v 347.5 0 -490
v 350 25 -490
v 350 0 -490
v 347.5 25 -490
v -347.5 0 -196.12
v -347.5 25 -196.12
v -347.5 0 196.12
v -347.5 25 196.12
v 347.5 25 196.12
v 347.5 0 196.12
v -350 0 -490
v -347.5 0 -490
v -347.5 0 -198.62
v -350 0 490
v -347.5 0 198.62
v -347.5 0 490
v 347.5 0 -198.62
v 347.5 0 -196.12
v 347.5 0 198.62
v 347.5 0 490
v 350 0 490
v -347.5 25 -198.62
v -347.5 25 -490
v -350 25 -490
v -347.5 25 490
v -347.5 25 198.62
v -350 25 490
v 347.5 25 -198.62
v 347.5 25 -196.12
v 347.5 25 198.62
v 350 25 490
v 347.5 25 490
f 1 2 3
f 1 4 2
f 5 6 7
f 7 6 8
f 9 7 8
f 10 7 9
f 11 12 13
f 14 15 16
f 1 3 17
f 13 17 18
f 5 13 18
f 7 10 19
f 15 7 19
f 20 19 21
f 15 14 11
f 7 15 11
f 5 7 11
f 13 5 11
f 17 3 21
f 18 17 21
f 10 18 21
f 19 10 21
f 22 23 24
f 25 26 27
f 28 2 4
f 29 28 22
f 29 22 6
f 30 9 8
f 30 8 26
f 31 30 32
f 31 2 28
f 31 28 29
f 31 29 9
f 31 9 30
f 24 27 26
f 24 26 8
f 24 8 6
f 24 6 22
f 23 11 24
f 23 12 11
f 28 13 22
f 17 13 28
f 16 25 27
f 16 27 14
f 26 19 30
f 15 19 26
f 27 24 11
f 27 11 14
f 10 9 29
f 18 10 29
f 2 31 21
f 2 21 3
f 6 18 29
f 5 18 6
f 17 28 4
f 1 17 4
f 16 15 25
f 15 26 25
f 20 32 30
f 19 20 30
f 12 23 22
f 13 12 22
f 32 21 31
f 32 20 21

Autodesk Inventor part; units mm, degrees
ref_plane "YZ Plane" through (0, 0, 0) normal (1, 0, 0) x (0, 1, 0)
ref_plane "XZ Plane" through (0, 0, 0) normal (0, 1, 0) x (-1, 0, 0)
ref_plane "XY Plane" through (0, 0, 0) normal (0, 0, 1) x (1, 0, 0)
sketch "Sketch1" plane through (0, 0, 0) normal (0, 1, 0) x (-1, 0, 0)
  line L0 (345, 196.12) -> (-345, 196.12)
  line L1 (-345, 196.12) -> (-345, -196.12)
  line L2 (-345, -196.12) -> (345, -196.12)
  line L3 (345, -196.12) -> (345, 196.12)
  line L4 (345, 196.12) -> (-345, -196.12) construction
  line L5 (-345, 196.12) -> (345, -196.12) construction
  line L6 (347.5, -198.62) -> (-347.5, -198.62)
  line L7 (-347.5, -198.62) -> (-347.5, 198.62)
  line L8 (-347.5, 198.62) -> (347.5, 198.62)
  line L9 (347.5, 198.62) -> (347.5, -198.62)
  line L10 (345, -196.12) -> (347.5, -196.12)
  line L11 (345, 196.12) -> (347.5, 196.12)
  line L12 (-345, -196.12) -> (-347.5, -196.12)
  line L13 (-345, 196.12) -> (-347.5, 196.12)
  point P0 (0, 0)
  dimension "d0" = 690
  dimension "d1" = 392.24
  dimension "d2" = 2.5
extrude "Extrusion1" add sketch "Sketch1" along normal blind 25 contours L0 L13 L7 L8 L9 L11 | L10 L9 L6 L7 L12 L2
sketch "Sketch2" plane through (347.5, 0, 198.62) normal (1, 0, 0) x (0, 0, -1)
  line L0 (-291.38, 25) -> (688.62, 25)
  line L1 (688.62, 25) -> (688.62, -25)
  line L2 (688.62, -25) -> (-291.38, -25)
  line L3 (-291.38, -25) -> (-291.38, 25)
  line L4 (-291.38, 25) -> (688.62, -25) construction
  line L5 (688.62, 25) -> (-291.38, -25) construction
  line L6 (-291.38, 0) -> (688.62, 0)
  point P0 (198.62, 0)
  dimension "d5" = 980
  dimension "d6" = 50
extrude "Extrusion2" add sketch "Sketch2" along normal blind 2.5 contours L0 L1 L6 L3
mirror "Mirror1" about plane through (0, 0, 0) normal (1, 0, 0) of "Extrusion2"
properties part number "SOPORTE INERCIAL DE LA CAJA SEPARADORA"
